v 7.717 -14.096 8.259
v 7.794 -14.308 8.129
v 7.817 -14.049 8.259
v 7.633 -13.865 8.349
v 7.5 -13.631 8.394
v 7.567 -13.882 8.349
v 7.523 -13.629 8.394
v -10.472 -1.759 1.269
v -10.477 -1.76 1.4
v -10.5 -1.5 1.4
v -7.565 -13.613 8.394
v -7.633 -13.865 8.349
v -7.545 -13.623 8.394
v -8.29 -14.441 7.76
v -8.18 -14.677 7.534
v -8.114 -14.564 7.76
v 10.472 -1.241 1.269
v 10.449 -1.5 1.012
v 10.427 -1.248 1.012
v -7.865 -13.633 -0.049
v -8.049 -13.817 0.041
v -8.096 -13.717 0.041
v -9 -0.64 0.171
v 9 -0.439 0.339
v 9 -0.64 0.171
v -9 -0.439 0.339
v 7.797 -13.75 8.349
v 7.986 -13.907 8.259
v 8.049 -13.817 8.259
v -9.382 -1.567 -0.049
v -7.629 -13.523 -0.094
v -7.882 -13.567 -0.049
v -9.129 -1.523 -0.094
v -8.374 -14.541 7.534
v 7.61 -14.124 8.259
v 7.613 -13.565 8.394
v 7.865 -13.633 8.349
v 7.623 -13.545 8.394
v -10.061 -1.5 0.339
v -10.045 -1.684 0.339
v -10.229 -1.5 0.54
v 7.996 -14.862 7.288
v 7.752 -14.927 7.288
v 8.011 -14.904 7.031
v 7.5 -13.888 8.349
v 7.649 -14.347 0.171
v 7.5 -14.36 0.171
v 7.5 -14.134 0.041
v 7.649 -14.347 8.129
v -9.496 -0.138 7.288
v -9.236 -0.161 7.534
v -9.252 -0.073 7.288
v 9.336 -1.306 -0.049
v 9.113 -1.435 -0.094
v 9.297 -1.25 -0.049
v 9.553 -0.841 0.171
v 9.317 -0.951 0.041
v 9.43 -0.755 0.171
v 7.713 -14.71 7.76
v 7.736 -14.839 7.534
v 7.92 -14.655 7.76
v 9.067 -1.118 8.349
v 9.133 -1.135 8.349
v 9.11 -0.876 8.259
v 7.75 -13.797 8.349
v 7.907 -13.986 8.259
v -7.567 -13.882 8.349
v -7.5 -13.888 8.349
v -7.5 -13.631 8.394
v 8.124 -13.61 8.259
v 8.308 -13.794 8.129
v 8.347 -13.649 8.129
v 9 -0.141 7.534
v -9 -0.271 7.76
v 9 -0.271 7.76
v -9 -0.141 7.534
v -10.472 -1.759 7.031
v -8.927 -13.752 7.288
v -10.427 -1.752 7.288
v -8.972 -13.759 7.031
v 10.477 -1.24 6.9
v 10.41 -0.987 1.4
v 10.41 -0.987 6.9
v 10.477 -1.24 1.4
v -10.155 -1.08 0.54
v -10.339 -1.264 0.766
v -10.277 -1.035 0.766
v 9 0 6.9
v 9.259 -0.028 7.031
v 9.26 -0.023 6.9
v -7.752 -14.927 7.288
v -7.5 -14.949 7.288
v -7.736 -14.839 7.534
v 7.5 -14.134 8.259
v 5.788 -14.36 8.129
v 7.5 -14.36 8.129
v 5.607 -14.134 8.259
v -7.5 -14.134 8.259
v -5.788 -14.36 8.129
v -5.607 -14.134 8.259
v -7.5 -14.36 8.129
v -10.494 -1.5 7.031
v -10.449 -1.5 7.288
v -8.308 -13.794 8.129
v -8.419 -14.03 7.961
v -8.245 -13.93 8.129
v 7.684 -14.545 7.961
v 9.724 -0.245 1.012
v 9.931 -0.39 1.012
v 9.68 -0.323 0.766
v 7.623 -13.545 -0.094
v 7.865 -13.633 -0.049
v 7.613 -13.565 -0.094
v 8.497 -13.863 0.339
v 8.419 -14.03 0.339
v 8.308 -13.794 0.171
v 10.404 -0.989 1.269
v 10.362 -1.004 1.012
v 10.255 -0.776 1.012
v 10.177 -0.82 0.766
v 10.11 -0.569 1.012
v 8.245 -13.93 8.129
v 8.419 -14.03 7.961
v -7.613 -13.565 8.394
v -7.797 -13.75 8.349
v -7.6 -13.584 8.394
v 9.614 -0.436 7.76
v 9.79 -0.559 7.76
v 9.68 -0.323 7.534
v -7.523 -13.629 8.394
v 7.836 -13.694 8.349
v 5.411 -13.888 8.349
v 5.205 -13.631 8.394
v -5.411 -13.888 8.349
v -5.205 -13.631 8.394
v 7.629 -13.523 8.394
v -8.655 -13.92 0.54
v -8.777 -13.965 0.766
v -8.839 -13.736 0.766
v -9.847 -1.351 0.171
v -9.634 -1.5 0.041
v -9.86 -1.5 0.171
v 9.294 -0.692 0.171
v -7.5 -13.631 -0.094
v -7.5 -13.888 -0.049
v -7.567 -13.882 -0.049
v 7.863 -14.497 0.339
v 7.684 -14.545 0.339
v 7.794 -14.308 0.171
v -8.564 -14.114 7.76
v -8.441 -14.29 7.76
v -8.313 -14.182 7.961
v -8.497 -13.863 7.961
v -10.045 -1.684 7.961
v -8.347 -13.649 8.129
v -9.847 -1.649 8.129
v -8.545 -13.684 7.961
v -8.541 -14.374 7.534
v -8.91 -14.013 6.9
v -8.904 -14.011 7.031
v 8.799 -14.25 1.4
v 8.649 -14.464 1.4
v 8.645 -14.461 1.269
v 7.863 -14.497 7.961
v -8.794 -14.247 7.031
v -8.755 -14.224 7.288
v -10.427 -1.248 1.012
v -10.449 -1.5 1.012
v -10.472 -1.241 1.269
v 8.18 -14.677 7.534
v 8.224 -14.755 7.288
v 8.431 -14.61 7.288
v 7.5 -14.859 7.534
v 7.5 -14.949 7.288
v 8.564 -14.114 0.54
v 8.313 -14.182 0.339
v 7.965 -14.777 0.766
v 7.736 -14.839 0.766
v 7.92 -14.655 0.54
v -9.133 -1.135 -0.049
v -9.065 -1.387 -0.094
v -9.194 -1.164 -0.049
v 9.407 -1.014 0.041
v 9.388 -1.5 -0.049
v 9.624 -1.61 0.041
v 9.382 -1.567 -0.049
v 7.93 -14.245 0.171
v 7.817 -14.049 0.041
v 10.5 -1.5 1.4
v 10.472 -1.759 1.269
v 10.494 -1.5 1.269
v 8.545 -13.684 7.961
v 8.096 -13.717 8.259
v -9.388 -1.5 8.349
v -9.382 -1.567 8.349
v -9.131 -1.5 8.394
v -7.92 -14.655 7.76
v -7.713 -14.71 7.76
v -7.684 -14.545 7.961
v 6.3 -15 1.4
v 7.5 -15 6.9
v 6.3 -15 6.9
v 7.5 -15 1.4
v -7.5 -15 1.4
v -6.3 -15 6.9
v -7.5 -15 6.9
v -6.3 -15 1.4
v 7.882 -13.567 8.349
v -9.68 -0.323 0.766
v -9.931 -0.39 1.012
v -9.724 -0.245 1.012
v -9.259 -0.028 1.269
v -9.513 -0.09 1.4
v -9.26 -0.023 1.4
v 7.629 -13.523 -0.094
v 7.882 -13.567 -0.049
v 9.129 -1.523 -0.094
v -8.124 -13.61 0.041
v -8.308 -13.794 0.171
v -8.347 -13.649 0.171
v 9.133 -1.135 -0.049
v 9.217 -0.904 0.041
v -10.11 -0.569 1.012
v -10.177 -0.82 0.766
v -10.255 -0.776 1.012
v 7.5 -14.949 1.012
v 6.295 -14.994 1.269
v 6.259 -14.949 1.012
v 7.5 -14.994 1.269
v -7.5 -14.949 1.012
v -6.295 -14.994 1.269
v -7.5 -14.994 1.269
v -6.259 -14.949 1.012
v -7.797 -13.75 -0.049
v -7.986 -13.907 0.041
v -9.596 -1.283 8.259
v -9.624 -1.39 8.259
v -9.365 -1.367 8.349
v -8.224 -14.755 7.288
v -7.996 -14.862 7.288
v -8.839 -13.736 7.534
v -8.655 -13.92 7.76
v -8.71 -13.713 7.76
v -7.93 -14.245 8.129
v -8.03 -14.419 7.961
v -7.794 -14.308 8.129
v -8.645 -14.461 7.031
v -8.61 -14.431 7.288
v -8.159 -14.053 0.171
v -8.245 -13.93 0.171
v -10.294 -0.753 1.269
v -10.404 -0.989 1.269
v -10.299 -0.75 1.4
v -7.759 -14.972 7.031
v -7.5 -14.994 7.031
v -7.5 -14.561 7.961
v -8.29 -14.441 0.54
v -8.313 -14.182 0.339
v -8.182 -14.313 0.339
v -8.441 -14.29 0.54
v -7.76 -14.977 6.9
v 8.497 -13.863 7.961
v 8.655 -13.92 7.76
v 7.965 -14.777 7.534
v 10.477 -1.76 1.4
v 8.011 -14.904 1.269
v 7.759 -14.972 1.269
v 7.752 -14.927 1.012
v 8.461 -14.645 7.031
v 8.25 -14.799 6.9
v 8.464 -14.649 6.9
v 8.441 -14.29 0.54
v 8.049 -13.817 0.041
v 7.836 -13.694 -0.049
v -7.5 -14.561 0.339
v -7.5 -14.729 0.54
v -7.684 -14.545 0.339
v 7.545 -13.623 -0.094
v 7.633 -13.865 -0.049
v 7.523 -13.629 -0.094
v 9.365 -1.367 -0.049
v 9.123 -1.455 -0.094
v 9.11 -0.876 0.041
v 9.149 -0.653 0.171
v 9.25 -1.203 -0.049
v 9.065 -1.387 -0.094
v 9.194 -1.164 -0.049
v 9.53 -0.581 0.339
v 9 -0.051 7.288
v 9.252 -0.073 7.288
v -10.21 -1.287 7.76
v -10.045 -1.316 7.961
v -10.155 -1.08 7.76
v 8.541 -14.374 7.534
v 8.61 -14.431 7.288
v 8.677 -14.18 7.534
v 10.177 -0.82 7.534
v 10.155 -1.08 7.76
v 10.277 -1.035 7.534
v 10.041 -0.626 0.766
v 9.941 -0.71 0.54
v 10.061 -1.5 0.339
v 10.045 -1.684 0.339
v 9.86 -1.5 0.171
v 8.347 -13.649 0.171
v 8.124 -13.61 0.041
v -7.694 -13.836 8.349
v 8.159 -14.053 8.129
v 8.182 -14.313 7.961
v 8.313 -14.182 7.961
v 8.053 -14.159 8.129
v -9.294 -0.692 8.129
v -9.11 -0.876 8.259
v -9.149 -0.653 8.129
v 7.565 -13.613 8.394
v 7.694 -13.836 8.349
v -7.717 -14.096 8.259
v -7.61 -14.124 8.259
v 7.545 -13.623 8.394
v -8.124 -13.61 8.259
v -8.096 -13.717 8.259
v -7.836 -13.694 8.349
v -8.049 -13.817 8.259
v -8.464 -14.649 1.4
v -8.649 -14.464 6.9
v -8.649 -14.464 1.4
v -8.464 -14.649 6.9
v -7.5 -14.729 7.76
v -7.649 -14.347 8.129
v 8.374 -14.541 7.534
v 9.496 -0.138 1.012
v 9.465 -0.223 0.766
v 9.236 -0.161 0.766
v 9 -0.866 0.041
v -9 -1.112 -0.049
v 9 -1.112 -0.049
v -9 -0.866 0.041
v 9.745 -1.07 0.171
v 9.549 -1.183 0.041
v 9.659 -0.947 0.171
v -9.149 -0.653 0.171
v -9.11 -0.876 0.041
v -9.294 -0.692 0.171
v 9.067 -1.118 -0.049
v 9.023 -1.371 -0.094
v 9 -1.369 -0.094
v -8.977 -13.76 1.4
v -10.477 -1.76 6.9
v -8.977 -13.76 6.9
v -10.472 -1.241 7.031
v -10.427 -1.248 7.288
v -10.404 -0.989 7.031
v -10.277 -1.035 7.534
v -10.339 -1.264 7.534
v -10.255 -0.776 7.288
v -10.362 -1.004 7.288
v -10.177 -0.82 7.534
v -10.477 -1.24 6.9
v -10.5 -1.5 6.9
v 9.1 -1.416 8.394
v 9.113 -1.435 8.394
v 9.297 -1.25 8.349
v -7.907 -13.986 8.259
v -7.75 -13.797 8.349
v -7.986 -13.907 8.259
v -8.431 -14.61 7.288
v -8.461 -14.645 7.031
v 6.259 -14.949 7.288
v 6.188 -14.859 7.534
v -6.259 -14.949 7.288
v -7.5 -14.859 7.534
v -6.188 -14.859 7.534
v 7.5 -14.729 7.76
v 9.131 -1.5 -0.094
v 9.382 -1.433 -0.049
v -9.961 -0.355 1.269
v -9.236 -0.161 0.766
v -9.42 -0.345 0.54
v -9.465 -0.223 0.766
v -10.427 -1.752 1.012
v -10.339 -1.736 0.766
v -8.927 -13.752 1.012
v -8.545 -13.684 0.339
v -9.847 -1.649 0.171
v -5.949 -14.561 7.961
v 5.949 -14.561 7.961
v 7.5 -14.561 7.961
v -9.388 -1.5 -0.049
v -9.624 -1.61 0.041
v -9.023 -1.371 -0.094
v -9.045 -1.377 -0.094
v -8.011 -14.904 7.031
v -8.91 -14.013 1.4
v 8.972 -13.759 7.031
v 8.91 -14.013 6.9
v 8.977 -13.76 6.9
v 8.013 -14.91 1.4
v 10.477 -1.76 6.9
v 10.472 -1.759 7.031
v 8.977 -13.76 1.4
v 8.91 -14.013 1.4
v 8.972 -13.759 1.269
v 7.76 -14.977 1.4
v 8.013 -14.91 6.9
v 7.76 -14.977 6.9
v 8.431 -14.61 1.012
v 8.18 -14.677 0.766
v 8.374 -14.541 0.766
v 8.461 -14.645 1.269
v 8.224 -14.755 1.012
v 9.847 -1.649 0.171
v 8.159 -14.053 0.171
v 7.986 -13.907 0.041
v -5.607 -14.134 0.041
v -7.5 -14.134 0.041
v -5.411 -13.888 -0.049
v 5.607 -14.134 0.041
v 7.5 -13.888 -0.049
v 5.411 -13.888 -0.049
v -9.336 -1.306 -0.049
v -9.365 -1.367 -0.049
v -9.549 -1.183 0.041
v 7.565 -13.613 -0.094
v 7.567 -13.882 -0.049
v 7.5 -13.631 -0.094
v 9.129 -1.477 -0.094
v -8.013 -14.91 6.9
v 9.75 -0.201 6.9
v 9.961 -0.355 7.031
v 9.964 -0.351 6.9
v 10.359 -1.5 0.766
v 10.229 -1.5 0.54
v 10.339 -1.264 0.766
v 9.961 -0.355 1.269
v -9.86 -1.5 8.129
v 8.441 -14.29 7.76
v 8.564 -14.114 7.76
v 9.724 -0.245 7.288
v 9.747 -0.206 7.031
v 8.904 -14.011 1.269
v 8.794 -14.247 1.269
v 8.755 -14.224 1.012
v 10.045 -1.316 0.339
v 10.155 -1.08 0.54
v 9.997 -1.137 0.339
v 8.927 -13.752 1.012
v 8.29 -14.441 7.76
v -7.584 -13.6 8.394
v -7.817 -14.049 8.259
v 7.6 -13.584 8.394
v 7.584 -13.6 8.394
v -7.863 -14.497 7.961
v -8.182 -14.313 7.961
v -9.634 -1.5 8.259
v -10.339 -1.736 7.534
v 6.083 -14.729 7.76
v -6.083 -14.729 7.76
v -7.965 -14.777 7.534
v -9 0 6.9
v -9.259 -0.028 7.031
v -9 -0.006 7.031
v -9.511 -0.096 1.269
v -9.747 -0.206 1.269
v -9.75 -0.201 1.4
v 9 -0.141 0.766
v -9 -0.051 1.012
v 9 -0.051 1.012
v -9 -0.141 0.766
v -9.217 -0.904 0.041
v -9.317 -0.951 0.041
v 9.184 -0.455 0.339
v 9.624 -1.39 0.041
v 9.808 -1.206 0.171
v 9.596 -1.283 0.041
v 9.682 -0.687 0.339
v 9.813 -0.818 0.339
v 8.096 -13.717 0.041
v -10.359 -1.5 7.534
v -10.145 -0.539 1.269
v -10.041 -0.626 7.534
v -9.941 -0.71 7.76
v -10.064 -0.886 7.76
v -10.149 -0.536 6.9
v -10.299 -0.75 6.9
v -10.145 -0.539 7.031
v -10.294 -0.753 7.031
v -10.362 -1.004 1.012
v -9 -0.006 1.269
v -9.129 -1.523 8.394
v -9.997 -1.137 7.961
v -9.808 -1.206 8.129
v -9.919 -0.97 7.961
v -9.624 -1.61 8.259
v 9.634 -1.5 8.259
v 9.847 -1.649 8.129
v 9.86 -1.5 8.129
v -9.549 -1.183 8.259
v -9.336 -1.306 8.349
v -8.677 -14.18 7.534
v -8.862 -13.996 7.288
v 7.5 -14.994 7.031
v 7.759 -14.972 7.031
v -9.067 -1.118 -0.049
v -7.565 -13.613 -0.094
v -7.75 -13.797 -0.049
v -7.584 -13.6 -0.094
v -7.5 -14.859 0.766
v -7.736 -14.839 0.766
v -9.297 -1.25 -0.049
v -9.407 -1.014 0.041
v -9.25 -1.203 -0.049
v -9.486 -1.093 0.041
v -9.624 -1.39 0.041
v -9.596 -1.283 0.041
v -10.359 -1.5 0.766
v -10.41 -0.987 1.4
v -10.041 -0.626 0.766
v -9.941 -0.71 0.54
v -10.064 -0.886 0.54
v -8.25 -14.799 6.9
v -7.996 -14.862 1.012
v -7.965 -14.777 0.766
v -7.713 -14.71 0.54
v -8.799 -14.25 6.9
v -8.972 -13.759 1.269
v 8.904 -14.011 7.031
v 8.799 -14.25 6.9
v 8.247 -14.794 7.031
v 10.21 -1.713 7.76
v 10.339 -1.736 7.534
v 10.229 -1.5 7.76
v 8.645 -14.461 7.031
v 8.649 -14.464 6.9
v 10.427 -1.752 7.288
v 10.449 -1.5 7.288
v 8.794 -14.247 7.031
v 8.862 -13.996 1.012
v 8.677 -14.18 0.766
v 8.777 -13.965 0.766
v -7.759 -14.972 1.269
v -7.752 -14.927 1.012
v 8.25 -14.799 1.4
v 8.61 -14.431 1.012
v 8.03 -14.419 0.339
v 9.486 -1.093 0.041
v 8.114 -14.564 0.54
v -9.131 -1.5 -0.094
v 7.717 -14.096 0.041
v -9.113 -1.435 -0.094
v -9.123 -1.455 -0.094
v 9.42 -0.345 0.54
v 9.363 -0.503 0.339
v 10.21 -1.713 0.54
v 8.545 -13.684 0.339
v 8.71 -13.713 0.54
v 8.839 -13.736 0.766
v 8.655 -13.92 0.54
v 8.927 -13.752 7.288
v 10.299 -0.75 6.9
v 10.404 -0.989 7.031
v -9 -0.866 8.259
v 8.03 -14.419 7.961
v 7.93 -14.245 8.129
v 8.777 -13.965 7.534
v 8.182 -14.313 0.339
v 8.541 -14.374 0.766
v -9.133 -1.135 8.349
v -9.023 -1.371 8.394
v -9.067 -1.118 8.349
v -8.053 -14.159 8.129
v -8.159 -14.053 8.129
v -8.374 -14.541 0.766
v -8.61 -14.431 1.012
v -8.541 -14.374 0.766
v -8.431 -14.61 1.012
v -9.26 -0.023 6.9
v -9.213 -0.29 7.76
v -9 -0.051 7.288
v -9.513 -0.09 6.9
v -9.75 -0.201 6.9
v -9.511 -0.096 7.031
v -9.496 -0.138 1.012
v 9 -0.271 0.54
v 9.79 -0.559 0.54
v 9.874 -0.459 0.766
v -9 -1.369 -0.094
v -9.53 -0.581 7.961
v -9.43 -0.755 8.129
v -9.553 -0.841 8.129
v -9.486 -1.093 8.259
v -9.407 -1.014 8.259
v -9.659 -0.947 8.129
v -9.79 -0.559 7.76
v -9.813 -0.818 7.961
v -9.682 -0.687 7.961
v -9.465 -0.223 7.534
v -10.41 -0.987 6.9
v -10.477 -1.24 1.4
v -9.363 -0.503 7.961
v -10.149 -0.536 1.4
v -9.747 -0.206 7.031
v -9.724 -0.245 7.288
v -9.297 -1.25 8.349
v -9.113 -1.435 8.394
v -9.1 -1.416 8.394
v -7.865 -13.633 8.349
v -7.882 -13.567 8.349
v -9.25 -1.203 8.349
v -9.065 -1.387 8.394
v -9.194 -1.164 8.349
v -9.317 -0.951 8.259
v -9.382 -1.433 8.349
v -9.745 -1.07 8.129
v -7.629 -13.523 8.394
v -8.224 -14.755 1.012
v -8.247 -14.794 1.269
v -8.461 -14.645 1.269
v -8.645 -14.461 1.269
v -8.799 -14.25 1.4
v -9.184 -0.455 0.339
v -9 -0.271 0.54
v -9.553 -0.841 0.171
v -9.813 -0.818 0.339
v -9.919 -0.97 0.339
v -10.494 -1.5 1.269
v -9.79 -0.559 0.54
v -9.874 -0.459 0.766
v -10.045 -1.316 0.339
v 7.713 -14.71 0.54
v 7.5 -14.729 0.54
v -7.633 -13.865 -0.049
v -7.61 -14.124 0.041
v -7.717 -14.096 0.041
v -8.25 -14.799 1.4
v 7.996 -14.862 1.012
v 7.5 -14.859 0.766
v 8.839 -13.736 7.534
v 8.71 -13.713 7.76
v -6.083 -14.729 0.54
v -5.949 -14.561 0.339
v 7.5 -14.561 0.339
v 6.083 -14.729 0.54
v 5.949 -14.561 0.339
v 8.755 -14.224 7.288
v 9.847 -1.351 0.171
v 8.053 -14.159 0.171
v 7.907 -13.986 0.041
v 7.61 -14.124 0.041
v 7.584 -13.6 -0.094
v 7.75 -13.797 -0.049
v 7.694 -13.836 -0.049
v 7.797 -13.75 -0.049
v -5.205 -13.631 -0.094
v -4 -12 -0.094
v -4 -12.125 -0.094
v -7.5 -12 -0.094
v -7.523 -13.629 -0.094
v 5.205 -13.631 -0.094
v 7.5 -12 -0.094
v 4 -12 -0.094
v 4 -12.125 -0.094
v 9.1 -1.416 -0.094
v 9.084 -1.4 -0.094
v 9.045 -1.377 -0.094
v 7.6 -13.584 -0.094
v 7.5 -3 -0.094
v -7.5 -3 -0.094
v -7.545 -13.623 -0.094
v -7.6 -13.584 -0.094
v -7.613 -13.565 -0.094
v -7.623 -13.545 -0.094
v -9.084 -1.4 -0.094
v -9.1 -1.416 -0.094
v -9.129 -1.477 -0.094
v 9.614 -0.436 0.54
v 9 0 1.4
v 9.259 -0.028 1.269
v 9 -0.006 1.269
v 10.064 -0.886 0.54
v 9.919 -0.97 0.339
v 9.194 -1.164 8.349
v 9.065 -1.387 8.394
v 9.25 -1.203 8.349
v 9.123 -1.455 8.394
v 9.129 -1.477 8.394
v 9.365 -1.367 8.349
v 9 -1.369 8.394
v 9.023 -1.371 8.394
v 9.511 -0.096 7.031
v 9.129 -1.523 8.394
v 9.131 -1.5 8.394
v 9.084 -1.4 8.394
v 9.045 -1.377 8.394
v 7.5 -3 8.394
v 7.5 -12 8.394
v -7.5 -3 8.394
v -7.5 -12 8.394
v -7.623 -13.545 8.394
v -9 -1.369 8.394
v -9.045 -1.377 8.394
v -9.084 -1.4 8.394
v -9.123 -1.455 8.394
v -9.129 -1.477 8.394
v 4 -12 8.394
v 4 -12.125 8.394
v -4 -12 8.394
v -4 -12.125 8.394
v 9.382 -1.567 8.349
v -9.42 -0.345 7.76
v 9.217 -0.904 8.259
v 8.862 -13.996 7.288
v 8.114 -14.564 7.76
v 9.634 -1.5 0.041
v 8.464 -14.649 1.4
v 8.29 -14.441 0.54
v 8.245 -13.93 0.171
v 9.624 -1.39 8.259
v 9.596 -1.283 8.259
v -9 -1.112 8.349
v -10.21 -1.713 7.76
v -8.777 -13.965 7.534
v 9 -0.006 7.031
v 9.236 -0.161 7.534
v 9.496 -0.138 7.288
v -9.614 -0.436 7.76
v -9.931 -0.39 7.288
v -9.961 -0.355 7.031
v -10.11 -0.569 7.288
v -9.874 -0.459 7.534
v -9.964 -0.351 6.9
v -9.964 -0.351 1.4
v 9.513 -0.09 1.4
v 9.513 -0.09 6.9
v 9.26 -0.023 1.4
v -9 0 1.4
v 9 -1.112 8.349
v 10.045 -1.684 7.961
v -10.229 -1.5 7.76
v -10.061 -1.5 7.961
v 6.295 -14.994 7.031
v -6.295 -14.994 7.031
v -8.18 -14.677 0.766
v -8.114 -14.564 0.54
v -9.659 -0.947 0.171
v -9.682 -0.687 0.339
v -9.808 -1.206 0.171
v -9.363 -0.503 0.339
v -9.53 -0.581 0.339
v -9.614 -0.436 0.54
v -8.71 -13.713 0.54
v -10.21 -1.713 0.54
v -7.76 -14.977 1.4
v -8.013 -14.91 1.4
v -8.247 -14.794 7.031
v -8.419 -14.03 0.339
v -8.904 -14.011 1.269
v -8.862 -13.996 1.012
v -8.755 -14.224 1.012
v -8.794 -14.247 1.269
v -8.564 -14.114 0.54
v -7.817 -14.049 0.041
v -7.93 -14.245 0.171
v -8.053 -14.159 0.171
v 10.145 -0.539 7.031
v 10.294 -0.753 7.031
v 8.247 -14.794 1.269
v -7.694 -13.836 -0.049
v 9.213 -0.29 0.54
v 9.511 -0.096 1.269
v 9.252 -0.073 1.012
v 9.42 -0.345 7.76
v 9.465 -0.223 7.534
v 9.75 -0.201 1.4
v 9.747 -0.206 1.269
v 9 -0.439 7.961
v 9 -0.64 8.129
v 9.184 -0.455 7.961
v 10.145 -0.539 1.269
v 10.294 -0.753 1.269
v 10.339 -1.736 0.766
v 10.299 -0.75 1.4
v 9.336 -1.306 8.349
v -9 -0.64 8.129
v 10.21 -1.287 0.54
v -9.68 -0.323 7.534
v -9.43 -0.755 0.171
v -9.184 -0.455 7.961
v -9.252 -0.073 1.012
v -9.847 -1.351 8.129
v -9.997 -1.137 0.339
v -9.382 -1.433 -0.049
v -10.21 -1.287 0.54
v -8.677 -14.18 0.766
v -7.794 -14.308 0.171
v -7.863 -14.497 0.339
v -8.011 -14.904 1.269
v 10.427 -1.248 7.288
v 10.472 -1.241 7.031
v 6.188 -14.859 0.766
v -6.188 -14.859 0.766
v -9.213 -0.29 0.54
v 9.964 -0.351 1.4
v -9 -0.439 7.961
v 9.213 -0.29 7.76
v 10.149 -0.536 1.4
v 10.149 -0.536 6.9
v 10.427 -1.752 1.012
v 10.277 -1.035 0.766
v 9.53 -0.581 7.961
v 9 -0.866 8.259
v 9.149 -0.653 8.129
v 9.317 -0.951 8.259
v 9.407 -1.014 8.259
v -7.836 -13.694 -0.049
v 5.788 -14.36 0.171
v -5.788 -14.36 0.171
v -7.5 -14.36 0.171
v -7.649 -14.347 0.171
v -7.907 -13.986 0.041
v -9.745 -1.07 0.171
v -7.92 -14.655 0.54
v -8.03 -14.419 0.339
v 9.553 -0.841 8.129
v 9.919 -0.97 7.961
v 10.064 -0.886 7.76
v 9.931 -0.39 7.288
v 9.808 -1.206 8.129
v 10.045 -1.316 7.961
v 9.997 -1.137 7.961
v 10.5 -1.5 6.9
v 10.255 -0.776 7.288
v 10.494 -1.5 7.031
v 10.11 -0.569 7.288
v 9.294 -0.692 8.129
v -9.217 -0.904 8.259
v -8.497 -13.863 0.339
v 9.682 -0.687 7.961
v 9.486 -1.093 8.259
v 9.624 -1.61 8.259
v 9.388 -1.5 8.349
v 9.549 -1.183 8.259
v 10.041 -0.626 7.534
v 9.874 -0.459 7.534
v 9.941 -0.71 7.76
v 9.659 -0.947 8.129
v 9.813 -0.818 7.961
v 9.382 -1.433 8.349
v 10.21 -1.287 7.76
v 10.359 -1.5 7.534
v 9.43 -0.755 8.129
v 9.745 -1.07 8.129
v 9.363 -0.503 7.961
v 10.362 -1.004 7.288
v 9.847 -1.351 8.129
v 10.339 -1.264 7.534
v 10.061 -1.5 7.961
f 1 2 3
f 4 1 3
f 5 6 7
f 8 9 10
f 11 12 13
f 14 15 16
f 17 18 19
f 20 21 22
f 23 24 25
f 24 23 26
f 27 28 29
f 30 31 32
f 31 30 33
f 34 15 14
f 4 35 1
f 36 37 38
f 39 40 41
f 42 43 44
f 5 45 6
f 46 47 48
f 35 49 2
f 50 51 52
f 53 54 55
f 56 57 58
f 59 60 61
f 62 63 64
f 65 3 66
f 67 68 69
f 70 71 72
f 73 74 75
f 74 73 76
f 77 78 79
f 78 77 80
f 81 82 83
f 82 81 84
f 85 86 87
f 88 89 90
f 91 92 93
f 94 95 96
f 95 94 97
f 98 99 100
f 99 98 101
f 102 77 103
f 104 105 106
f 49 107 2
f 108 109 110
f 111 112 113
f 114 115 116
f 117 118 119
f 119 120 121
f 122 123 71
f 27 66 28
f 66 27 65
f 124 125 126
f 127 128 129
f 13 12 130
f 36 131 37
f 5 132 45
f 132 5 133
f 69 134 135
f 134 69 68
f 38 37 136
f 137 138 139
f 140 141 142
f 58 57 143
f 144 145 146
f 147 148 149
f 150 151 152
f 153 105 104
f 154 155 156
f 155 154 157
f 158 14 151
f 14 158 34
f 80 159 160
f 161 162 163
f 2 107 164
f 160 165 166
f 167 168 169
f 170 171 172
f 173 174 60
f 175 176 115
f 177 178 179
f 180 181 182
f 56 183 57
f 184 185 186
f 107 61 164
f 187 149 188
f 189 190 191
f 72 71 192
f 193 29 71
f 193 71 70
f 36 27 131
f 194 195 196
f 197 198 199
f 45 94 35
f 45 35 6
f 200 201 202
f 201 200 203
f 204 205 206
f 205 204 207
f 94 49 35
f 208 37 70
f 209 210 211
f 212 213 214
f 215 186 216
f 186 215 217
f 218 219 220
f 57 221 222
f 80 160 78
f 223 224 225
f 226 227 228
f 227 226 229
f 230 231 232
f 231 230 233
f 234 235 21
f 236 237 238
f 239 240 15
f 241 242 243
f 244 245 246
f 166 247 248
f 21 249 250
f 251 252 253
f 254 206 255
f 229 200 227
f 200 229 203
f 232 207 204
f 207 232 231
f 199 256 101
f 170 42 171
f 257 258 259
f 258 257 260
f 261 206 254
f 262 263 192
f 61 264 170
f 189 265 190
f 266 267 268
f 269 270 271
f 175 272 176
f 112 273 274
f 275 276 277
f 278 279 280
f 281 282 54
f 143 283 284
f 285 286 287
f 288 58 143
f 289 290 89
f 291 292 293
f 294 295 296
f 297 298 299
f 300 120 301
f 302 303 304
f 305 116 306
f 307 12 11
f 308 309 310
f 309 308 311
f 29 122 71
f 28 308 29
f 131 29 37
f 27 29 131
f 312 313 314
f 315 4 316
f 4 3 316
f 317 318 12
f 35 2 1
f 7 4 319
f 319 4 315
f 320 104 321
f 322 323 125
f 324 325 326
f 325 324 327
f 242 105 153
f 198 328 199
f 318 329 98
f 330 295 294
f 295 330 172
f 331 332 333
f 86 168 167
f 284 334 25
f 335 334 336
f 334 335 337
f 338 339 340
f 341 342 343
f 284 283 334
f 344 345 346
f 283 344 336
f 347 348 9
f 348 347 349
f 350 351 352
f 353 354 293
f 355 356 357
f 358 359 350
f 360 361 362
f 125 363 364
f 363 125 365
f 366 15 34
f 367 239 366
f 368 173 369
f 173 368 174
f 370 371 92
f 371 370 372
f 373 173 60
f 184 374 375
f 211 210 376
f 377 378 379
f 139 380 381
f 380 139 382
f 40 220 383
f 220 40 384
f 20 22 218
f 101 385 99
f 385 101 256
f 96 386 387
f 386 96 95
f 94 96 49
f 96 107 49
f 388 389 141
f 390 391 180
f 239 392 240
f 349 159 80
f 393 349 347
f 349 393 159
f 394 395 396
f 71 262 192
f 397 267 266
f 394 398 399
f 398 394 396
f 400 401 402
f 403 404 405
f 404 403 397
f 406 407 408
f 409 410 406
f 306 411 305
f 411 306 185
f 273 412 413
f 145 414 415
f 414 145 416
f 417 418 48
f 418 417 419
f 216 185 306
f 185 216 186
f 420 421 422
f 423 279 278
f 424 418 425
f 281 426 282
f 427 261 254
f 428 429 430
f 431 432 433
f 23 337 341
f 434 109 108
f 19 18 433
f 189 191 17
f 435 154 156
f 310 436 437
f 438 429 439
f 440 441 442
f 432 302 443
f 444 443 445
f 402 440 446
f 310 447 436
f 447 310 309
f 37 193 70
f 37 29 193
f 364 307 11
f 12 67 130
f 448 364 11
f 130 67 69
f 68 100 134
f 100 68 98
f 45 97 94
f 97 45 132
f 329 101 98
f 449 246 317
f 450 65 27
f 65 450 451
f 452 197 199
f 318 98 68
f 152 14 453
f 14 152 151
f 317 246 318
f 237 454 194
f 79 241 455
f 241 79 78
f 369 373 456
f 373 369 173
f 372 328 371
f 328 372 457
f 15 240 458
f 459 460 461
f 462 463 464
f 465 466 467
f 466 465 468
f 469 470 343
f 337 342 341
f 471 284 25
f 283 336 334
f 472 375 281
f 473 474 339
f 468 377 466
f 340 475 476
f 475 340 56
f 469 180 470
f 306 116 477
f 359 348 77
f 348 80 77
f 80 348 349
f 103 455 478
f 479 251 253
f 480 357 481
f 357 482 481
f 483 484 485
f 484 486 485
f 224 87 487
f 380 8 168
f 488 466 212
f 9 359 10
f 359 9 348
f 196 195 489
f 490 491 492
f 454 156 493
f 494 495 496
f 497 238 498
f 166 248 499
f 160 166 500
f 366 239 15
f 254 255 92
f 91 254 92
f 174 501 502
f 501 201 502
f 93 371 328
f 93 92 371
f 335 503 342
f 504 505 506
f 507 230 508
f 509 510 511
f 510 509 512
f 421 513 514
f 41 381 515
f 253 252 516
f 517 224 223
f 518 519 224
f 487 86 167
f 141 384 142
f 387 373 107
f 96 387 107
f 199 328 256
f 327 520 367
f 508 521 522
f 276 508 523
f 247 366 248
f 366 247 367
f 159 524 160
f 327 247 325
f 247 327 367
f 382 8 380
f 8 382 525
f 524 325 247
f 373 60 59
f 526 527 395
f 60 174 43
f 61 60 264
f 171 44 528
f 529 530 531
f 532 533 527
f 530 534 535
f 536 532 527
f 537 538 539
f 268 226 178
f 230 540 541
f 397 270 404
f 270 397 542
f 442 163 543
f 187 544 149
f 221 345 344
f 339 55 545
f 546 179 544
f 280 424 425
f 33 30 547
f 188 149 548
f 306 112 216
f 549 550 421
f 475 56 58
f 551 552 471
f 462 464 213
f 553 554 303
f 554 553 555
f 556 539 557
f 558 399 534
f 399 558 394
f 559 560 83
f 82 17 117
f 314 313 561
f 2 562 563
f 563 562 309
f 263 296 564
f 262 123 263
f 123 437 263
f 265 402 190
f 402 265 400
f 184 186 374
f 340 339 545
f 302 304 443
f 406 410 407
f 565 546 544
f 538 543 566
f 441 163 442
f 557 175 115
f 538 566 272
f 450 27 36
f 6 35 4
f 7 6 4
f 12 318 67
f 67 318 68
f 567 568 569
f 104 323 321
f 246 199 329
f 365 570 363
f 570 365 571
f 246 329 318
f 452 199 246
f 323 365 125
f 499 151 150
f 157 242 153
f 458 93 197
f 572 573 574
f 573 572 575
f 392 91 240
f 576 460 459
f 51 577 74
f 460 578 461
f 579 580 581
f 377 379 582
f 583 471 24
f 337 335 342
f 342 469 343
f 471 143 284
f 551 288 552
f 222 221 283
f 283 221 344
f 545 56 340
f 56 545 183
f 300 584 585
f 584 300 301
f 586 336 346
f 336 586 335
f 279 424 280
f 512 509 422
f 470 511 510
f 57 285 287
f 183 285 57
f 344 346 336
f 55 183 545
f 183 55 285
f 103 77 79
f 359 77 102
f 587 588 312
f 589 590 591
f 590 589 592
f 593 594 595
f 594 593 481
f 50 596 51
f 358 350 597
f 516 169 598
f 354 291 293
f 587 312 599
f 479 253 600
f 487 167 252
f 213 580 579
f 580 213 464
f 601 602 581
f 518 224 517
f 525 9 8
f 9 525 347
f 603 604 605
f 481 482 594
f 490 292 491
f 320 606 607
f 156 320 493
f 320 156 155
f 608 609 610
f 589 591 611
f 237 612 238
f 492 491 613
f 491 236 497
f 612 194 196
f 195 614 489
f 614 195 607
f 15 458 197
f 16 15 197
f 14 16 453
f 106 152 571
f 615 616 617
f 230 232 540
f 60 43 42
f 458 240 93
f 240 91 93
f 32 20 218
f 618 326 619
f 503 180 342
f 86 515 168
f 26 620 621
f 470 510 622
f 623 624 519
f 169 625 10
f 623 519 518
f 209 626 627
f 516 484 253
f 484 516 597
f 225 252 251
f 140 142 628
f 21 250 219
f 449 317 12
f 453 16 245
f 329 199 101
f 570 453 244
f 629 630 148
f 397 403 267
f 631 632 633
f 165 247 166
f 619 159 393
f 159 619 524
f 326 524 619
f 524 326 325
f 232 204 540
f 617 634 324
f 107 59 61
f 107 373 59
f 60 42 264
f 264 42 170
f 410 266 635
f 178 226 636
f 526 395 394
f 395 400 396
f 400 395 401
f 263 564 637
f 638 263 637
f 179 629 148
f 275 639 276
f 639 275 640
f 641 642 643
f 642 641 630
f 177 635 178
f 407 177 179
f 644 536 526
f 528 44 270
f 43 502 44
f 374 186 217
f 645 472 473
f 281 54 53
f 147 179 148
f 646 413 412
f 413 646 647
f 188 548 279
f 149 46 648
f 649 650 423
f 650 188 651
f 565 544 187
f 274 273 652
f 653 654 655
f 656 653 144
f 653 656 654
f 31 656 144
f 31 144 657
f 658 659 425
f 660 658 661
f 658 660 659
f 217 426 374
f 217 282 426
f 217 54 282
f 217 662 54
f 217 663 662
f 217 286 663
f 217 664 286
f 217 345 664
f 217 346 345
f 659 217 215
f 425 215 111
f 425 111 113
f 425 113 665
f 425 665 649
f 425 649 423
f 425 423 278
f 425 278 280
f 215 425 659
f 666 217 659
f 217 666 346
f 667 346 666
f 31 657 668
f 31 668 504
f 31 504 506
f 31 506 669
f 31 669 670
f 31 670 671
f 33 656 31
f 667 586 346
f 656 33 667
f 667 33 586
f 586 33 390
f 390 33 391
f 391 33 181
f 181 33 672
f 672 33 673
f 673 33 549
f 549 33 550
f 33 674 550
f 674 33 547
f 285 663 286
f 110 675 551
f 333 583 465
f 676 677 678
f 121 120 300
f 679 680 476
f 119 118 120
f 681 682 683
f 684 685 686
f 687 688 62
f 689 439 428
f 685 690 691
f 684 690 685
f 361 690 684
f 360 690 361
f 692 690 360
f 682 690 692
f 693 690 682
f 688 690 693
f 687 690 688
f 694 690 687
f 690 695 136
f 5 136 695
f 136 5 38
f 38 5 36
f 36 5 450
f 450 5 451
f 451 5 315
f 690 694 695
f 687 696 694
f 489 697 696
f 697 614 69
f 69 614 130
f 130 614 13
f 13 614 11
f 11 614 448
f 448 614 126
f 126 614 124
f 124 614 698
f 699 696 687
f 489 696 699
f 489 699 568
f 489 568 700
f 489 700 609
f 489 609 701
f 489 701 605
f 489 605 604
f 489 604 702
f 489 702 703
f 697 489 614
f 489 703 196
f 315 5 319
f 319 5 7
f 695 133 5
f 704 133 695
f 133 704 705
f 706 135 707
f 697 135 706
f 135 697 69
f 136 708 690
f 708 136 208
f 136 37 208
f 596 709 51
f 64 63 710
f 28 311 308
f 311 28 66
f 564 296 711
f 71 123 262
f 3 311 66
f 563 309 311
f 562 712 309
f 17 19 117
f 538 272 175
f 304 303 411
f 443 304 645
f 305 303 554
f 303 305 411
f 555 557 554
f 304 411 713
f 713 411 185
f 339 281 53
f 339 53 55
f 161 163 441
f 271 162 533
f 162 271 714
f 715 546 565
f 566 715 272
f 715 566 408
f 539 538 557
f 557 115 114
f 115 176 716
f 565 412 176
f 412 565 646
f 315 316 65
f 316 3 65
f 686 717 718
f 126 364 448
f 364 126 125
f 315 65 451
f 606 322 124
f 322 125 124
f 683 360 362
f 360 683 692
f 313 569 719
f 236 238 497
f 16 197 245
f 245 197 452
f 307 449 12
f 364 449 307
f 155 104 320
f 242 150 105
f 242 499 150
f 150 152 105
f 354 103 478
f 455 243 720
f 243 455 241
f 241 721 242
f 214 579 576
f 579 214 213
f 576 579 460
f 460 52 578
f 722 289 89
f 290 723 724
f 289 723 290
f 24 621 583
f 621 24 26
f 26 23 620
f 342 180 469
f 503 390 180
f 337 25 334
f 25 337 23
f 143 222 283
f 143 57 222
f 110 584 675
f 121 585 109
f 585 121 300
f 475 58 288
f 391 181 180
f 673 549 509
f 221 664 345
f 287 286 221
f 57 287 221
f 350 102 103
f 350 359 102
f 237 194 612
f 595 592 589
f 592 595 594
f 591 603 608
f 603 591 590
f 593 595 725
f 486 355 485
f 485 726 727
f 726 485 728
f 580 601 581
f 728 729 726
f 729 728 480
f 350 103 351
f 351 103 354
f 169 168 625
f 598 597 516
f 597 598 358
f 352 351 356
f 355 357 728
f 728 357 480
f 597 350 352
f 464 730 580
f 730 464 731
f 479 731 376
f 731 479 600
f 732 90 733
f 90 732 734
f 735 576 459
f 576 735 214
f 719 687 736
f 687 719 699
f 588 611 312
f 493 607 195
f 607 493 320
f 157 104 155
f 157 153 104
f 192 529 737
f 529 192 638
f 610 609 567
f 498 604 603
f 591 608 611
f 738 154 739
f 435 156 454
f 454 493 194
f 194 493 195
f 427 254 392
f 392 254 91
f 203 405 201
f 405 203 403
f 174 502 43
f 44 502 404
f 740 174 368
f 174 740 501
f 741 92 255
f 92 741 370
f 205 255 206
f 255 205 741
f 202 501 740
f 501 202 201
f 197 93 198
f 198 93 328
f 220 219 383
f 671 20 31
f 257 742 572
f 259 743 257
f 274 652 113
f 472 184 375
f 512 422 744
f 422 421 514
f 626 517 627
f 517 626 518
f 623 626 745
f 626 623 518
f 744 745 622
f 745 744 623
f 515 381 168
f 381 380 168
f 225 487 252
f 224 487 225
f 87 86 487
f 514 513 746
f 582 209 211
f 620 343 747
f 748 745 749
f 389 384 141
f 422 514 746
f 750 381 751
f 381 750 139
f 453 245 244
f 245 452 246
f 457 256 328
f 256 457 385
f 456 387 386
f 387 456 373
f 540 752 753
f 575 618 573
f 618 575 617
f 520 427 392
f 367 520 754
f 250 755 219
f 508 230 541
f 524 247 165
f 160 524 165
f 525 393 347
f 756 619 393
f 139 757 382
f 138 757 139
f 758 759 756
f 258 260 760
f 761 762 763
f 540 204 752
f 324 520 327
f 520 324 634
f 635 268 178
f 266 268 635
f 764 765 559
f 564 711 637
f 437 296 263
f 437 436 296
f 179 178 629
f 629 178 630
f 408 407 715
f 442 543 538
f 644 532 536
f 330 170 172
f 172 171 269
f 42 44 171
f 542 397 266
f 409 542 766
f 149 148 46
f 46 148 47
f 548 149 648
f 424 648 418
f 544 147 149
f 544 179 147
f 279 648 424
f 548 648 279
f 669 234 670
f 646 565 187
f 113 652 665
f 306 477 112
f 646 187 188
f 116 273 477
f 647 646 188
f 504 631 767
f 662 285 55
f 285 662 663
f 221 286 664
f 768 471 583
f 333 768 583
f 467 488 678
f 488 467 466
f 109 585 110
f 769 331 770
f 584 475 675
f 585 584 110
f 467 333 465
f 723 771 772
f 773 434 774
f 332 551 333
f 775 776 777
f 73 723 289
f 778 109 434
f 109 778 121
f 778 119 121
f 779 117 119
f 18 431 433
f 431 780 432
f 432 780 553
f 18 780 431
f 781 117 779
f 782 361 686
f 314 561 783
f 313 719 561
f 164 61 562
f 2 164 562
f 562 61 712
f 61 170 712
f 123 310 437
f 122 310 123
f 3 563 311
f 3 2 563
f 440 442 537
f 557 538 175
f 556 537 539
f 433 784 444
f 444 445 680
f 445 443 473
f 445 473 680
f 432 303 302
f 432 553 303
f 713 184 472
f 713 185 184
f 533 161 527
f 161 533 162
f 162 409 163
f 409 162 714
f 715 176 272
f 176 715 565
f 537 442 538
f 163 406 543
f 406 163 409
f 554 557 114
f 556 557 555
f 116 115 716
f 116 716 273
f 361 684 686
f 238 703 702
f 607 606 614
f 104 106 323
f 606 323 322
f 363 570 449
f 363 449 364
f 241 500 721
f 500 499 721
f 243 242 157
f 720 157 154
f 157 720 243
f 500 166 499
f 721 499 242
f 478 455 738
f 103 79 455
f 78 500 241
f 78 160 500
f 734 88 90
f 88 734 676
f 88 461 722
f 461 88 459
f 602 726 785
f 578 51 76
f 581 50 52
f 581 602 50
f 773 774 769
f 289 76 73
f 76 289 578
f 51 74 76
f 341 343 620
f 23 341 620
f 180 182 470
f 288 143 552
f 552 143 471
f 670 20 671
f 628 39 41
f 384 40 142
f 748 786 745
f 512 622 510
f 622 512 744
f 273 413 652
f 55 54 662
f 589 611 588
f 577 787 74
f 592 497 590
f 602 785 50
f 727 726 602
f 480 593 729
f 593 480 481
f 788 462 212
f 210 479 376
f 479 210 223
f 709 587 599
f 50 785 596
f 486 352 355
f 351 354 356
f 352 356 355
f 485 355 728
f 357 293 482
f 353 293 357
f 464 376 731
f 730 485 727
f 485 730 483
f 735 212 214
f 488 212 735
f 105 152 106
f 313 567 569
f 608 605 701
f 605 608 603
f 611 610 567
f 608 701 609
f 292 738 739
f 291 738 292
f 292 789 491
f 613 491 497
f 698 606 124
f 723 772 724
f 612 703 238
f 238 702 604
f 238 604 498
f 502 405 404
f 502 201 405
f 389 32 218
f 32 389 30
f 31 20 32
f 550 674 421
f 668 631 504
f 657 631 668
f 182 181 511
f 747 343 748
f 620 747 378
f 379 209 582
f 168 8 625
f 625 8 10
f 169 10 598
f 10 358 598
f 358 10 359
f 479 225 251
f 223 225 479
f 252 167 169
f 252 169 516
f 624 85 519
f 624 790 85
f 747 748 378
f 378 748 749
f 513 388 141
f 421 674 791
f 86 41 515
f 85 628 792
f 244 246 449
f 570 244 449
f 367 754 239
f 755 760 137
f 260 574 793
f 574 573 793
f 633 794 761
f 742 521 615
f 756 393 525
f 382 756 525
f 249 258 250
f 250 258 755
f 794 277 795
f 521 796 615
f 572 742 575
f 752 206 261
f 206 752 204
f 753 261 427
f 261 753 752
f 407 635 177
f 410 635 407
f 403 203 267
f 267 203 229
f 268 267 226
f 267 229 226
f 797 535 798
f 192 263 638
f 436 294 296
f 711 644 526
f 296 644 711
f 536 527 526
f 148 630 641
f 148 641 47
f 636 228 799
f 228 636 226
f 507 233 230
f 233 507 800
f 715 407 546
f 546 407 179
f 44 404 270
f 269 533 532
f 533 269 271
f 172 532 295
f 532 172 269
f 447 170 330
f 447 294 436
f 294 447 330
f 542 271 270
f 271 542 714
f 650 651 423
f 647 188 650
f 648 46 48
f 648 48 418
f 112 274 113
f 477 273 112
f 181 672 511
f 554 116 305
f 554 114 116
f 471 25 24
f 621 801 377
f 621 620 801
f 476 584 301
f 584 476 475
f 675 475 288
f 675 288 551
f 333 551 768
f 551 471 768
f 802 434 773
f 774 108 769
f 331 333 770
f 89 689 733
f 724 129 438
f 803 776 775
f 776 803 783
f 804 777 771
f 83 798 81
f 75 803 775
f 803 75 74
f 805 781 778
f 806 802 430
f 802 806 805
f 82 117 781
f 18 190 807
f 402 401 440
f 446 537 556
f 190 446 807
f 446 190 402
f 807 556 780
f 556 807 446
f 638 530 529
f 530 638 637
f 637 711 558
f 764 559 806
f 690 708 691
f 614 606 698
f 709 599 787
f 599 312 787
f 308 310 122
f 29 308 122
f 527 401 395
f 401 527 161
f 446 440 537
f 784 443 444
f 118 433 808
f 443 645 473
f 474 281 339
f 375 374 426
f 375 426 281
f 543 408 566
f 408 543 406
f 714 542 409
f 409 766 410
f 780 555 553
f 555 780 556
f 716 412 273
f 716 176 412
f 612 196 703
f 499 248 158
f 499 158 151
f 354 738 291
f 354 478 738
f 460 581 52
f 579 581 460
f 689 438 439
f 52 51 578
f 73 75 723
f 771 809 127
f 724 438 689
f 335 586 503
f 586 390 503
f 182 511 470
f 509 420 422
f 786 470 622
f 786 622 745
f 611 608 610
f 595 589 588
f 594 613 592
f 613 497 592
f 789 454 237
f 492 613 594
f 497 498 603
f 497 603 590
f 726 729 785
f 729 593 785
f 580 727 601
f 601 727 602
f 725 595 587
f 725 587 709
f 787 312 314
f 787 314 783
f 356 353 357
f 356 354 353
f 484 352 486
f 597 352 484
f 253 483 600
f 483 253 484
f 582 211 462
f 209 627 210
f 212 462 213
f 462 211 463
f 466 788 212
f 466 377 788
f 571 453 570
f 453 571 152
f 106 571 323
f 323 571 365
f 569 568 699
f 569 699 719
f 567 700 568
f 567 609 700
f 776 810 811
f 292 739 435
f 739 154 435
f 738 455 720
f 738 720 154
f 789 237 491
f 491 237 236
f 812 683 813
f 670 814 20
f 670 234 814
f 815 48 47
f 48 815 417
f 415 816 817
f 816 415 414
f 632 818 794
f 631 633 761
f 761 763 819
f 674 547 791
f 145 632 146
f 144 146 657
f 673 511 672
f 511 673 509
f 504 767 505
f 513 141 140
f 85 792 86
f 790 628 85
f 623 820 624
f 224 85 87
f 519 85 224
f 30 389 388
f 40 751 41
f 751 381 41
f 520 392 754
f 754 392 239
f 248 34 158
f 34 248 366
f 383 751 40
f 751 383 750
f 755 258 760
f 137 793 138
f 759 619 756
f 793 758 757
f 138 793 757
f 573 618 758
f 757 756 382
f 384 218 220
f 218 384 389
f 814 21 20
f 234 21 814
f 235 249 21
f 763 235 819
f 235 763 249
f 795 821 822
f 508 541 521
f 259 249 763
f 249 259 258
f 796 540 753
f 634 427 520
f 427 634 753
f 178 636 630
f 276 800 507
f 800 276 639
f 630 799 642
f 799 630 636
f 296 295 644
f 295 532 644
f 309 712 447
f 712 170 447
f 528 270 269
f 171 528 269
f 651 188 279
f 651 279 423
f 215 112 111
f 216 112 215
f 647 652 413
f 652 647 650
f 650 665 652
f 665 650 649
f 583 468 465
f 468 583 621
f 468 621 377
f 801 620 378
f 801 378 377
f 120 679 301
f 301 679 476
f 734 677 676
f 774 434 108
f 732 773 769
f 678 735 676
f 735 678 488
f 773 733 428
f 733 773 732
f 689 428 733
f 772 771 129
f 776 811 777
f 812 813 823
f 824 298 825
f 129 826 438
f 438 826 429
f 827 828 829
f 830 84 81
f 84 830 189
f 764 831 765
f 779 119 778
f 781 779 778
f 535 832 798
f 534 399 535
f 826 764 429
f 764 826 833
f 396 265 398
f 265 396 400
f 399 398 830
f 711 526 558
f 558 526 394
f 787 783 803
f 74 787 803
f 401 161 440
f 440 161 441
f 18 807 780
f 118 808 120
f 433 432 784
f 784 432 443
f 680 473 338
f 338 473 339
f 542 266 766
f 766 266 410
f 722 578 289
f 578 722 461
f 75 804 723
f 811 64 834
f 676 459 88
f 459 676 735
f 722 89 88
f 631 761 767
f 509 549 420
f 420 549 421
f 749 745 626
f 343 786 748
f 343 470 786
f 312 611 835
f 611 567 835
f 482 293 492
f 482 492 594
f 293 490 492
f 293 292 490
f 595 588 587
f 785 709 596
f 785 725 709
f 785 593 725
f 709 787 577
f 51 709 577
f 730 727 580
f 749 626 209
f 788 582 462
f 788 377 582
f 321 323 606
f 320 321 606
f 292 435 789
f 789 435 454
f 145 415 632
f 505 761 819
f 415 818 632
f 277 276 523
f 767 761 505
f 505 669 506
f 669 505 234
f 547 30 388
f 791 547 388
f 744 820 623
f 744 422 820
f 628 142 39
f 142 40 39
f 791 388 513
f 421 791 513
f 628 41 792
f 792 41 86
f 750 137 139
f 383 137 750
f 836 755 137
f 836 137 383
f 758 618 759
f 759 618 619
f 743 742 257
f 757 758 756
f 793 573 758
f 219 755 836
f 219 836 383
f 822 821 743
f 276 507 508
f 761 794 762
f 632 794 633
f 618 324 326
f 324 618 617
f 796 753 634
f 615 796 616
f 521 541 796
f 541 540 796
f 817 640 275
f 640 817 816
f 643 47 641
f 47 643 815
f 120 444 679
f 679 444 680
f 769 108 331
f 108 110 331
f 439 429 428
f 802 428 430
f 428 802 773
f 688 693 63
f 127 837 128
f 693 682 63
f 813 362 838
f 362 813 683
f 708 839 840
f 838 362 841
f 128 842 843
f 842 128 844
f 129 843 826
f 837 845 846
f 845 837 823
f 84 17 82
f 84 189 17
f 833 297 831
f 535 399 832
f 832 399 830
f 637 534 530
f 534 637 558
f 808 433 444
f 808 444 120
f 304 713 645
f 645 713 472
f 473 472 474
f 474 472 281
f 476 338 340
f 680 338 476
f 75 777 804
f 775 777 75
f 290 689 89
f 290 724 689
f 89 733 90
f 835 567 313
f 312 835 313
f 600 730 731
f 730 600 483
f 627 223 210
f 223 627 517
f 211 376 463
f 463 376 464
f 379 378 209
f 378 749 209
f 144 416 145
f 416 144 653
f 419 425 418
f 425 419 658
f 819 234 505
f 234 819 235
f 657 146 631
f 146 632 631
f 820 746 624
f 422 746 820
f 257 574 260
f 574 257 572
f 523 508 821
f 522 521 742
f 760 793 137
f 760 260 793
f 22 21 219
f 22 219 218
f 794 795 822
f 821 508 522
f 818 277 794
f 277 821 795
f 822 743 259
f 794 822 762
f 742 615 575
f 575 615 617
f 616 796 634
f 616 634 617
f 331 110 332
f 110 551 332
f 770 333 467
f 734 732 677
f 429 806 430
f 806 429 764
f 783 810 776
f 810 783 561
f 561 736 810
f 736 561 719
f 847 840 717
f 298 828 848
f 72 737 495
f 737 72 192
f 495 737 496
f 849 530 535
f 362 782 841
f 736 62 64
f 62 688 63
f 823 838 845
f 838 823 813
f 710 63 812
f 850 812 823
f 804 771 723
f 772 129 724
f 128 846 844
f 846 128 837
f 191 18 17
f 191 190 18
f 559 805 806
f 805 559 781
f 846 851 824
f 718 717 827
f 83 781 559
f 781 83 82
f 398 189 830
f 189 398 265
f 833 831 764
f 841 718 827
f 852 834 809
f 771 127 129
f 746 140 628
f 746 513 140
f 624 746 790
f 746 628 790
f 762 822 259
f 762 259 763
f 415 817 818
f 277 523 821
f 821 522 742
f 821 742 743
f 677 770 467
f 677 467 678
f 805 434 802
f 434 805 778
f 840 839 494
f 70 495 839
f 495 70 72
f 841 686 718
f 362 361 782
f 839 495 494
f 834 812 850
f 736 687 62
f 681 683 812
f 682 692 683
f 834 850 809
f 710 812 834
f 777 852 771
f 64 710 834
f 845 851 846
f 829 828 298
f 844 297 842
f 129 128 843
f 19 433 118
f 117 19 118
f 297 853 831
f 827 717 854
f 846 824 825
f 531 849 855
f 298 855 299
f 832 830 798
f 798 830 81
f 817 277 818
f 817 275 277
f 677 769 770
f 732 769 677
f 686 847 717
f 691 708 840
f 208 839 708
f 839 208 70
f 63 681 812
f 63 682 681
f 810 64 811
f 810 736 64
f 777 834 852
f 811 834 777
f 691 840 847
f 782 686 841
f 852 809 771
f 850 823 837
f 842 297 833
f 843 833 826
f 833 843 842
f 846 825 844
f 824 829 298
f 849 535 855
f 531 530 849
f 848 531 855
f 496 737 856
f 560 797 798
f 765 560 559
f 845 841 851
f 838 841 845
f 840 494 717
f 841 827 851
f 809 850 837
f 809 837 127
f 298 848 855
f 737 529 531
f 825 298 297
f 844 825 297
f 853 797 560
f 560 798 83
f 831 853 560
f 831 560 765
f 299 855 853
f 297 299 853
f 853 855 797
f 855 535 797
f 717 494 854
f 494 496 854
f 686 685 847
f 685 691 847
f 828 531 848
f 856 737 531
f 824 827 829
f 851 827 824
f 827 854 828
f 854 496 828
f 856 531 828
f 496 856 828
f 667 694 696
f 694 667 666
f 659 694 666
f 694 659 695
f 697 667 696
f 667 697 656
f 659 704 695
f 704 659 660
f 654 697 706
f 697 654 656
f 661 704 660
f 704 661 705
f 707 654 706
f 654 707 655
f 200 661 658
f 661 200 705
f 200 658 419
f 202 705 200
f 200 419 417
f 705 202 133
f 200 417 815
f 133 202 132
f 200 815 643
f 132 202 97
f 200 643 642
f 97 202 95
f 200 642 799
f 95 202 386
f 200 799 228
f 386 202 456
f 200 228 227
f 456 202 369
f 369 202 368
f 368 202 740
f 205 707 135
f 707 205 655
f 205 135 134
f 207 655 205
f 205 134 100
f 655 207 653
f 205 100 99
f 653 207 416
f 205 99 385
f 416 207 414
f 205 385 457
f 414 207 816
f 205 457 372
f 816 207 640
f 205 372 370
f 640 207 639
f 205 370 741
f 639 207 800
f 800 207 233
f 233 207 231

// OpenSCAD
clip_height = 21;
clip_width = 8.5;
clip_depth = 15;
clip_wall = 3;
clip_lip = 5.5;
clip_lip_slope = 0.80;
radius = clip_height;
inner_radius = radius * sqrt(3)/2;

end_clip(clip_depth, clip_width, clip_height, clip_wall, clip_lip, clip_lip_slope);

module end_clip(x, y, z, wall, lip, slope) {
    inner_x = x - (2*wall);
    inner_z = z - (2*wall);
    outter_x = x-wall;
    outter_z = z-wall;
    gap = 8.0;
    
    rotate([90,0,90])
    translate([-x/2, y/2-0.1, 0])
    union() {
    difference() {
        hull() {
            translate([-outter_x/2, 0, -outter_z/2+(wall/2)]) rotate([90,0,0])
            dowel(wall, y);
            translate([outter_x/2, 0, -outter_z/2]) rotate([90,0,0])
            dowel(wall, y);
            translate([-outter_x/2, 0, outter_z/2-(wall/2)]) rotate([90,0,0])
            dowel(wall, y);
            translate([outter_x/2, 0, outter_z/2]) rotate([90,0,0])
            dowel(wall, y);
            }
  
        translate([0, 0, 0])
        cube([inner_x, y, inner_z],center=true);
        translate([-wall-1,0,0]) cube([inner_x+1,y+wall, gap],center=true);
            translate([-inner_x/2, -(y+1)/2, gap/2-0.1]) rotate([0,0,90]) prism(y+wall, y, y*slope);
        translate([-inner_x/2,  (y+1)/2, -gap/2+0.1]) rotate([0,180,90]) prism(y+wall, y, y*slope);
        }
        
    }
    
}

module dowel(w,h) {
    cylinder(h = h-w, r1 = w/2, r2 = w/2, $fn=36, center = true);
    translate([0,0,(h-w)/2])
    sphere(d = w, $fn=36);
    translate([0,0,-(h-w)/2])
    sphere(d = w, $fn=36);
}

module prism(l, w, h){
    polyhedron(
        points=[[0,0,0], [l,0,0], [l,w,0], [0,w,0], [0,w,h], [l,w,h]],
        faces=[[0,1,2,3],[5,4,3,2],[0,4,5,1],[0,3,4],[5,2,1]]
    );
}
